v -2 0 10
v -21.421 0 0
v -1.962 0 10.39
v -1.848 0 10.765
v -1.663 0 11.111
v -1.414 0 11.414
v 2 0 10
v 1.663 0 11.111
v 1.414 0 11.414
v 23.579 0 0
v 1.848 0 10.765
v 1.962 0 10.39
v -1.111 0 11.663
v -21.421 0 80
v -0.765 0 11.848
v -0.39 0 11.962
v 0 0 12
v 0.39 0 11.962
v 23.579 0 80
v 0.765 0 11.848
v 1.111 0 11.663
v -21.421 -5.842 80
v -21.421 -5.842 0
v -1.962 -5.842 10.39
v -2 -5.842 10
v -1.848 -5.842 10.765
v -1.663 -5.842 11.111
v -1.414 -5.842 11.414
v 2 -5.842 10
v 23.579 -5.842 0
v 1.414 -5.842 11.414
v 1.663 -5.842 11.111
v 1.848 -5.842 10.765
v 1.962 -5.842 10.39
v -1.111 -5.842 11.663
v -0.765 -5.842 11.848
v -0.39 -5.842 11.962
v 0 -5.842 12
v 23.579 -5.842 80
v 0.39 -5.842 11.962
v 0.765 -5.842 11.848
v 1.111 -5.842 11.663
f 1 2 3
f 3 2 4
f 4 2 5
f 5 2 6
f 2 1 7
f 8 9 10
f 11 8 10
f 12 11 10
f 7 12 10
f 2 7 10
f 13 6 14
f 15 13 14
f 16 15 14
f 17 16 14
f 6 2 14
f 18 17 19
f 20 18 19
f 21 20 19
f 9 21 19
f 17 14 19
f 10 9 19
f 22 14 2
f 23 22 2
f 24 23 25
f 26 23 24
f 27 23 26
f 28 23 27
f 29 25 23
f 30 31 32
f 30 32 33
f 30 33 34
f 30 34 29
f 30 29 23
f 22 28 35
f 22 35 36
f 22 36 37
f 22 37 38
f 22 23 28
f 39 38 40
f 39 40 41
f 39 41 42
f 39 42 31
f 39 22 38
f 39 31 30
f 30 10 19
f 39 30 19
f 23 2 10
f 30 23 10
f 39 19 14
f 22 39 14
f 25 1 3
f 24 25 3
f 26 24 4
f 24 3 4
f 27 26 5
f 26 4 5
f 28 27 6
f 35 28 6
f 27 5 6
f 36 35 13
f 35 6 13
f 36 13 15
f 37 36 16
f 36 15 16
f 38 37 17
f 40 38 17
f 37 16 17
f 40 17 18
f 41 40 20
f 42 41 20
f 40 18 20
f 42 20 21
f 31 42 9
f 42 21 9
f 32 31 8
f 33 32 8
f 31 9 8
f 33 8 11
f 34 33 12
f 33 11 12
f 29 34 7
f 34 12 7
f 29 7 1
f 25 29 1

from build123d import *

# Parameters (mm, degrees)
F1_DEPTH = 5.842


with BuildPart() as f1:
    # F0 (on Front) → F1 (new body)
    with BuildSketch(Plane.XZ):
        Polygon((23.578767, 80), (-21.421233, 80), (-21.421233, 0), (0.725202, 0), (23.578767, 0), align=None)
        with BuildLine():
            ThreePointArc((-2, 10), (0, 12), (2, 10))
            Line((2, 10), (-2, 10))
        make_face(mode=Mode.SUBTRACT)
    extrude(amount=F1_DEPTH)


solid = f1.part
